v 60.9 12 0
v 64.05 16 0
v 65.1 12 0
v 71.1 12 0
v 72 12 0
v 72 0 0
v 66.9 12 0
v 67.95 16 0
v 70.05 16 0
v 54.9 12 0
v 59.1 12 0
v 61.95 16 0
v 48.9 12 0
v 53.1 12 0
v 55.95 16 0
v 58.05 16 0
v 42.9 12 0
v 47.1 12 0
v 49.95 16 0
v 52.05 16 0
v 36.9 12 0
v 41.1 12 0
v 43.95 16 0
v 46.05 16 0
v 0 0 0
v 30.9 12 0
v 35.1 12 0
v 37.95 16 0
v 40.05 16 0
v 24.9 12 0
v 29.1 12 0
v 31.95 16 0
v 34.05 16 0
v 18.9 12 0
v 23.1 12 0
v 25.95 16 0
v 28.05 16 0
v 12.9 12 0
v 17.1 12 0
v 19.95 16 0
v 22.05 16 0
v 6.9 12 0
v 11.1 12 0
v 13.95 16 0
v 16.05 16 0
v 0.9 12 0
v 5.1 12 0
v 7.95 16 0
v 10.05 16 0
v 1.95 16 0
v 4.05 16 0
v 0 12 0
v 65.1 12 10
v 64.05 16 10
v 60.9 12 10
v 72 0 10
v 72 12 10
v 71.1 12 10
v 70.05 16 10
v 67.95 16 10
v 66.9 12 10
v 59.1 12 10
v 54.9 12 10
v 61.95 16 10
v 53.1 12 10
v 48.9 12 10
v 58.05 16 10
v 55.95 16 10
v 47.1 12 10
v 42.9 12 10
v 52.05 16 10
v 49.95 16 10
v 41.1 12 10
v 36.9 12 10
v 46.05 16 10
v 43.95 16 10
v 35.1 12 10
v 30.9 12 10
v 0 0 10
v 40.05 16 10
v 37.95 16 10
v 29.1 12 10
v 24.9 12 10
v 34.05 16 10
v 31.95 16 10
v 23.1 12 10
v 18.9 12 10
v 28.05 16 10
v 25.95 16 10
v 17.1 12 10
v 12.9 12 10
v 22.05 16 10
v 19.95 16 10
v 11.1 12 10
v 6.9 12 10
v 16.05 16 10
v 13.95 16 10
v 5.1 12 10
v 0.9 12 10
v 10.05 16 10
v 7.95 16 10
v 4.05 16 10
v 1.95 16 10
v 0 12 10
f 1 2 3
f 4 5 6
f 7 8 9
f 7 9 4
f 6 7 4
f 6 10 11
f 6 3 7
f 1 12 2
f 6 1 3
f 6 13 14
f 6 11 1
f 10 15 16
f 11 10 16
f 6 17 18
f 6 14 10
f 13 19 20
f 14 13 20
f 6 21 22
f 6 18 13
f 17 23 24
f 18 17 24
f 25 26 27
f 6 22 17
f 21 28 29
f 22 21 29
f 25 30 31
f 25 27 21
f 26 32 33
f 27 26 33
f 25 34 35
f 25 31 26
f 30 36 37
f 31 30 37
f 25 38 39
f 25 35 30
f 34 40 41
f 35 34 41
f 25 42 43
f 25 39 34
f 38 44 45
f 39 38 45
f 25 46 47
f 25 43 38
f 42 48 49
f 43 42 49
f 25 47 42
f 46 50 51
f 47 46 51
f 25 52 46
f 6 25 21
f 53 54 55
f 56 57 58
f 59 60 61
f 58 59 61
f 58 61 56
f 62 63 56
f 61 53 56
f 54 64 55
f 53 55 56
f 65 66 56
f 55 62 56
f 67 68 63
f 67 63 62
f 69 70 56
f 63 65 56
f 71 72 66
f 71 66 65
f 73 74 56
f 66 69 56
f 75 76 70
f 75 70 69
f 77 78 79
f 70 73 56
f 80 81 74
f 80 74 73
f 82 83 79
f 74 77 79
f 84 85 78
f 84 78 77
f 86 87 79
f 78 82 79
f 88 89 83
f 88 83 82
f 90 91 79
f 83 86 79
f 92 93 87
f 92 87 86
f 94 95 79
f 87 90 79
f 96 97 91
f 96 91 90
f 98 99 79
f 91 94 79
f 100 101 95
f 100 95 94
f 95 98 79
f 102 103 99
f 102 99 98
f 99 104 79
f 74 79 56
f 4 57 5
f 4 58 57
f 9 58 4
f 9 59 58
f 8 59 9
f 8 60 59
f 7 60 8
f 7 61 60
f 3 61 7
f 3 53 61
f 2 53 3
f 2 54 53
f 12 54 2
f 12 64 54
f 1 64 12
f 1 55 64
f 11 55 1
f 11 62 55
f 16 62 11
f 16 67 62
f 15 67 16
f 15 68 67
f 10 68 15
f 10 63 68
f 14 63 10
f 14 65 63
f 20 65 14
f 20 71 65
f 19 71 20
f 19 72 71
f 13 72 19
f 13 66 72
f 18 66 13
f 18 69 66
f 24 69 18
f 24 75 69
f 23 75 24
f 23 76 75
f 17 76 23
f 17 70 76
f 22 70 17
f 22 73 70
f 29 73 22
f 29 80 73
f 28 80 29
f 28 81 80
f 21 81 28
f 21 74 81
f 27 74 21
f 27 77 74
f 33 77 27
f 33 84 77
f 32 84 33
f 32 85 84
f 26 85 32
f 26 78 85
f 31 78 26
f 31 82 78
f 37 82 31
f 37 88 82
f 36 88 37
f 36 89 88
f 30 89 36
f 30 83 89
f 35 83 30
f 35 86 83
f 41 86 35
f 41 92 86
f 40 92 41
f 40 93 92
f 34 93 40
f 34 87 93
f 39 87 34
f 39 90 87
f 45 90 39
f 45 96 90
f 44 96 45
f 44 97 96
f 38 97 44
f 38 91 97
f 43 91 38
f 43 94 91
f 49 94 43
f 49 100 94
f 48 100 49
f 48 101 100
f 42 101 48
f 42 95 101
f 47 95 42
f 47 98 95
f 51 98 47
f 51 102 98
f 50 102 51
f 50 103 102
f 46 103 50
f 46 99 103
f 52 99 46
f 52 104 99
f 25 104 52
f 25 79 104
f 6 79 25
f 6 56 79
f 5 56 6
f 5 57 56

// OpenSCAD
$fn = 32;

// ----------------------------------------------------------------------
// Gear rack: 12 teeth, pitch 6 mm
// ----------------------------------------------------------------------

// --- parameters (mm) ---
teeth = 12;               // number of teeth
pitch = 6;                // tooth pitch, X
root_w = 4.2;             // tooth width at the root
tip_w = 2.1;              // tooth width at the tip
base_h = 12;              // rack body height, Y
tooth_h = 4;              // tooth height above the body
plate_t = 10;             // rack width, Z (extrusion height)

rack_l = teeth * pitch;  // overall length
total_h = base_h + tooth_h;  // overall height

profile = [[0, 0], [72, 0], [72, 12], [71.1, 12], [70.05, 16], [67.95, 16], [66.9, 12], [65.1, 12], [64.05, 16], [61.95, 16], [60.9, 12], [59.1, 12], [58.05, 16], [55.95, 16], [54.9, 12], [53.1, 12], [52.05, 16], [49.95, 16], [48.9, 12], [47.1, 12], [46.05, 16], [43.95, 16], [42.9, 12], [41.1, 12], [40.05, 16], [37.95, 16], [36.9, 12], [35.1, 12], [34.05, 16], [31.95, 16], [30.9, 12], [29.1, 12], [28.05, 16], [25.95, 16], [24.9, 12], [23.1, 12], [22.05, 16], [19.95, 16], [18.9, 12], [17.1, 12], [16.05, 16], [13.95, 16], [12.9, 12], [11.1, 12], [10.05, 16], [7.95, 16], [6.9, 12], [5.1, 12], [4.05, 16], [1.95, 16], [0.9, 12], [0, 12]];  // primary outline, 52 points, counter clockwise

// --- the one profile operation ---
linear_extrude(height = plate_t) polygon(points = profile);
